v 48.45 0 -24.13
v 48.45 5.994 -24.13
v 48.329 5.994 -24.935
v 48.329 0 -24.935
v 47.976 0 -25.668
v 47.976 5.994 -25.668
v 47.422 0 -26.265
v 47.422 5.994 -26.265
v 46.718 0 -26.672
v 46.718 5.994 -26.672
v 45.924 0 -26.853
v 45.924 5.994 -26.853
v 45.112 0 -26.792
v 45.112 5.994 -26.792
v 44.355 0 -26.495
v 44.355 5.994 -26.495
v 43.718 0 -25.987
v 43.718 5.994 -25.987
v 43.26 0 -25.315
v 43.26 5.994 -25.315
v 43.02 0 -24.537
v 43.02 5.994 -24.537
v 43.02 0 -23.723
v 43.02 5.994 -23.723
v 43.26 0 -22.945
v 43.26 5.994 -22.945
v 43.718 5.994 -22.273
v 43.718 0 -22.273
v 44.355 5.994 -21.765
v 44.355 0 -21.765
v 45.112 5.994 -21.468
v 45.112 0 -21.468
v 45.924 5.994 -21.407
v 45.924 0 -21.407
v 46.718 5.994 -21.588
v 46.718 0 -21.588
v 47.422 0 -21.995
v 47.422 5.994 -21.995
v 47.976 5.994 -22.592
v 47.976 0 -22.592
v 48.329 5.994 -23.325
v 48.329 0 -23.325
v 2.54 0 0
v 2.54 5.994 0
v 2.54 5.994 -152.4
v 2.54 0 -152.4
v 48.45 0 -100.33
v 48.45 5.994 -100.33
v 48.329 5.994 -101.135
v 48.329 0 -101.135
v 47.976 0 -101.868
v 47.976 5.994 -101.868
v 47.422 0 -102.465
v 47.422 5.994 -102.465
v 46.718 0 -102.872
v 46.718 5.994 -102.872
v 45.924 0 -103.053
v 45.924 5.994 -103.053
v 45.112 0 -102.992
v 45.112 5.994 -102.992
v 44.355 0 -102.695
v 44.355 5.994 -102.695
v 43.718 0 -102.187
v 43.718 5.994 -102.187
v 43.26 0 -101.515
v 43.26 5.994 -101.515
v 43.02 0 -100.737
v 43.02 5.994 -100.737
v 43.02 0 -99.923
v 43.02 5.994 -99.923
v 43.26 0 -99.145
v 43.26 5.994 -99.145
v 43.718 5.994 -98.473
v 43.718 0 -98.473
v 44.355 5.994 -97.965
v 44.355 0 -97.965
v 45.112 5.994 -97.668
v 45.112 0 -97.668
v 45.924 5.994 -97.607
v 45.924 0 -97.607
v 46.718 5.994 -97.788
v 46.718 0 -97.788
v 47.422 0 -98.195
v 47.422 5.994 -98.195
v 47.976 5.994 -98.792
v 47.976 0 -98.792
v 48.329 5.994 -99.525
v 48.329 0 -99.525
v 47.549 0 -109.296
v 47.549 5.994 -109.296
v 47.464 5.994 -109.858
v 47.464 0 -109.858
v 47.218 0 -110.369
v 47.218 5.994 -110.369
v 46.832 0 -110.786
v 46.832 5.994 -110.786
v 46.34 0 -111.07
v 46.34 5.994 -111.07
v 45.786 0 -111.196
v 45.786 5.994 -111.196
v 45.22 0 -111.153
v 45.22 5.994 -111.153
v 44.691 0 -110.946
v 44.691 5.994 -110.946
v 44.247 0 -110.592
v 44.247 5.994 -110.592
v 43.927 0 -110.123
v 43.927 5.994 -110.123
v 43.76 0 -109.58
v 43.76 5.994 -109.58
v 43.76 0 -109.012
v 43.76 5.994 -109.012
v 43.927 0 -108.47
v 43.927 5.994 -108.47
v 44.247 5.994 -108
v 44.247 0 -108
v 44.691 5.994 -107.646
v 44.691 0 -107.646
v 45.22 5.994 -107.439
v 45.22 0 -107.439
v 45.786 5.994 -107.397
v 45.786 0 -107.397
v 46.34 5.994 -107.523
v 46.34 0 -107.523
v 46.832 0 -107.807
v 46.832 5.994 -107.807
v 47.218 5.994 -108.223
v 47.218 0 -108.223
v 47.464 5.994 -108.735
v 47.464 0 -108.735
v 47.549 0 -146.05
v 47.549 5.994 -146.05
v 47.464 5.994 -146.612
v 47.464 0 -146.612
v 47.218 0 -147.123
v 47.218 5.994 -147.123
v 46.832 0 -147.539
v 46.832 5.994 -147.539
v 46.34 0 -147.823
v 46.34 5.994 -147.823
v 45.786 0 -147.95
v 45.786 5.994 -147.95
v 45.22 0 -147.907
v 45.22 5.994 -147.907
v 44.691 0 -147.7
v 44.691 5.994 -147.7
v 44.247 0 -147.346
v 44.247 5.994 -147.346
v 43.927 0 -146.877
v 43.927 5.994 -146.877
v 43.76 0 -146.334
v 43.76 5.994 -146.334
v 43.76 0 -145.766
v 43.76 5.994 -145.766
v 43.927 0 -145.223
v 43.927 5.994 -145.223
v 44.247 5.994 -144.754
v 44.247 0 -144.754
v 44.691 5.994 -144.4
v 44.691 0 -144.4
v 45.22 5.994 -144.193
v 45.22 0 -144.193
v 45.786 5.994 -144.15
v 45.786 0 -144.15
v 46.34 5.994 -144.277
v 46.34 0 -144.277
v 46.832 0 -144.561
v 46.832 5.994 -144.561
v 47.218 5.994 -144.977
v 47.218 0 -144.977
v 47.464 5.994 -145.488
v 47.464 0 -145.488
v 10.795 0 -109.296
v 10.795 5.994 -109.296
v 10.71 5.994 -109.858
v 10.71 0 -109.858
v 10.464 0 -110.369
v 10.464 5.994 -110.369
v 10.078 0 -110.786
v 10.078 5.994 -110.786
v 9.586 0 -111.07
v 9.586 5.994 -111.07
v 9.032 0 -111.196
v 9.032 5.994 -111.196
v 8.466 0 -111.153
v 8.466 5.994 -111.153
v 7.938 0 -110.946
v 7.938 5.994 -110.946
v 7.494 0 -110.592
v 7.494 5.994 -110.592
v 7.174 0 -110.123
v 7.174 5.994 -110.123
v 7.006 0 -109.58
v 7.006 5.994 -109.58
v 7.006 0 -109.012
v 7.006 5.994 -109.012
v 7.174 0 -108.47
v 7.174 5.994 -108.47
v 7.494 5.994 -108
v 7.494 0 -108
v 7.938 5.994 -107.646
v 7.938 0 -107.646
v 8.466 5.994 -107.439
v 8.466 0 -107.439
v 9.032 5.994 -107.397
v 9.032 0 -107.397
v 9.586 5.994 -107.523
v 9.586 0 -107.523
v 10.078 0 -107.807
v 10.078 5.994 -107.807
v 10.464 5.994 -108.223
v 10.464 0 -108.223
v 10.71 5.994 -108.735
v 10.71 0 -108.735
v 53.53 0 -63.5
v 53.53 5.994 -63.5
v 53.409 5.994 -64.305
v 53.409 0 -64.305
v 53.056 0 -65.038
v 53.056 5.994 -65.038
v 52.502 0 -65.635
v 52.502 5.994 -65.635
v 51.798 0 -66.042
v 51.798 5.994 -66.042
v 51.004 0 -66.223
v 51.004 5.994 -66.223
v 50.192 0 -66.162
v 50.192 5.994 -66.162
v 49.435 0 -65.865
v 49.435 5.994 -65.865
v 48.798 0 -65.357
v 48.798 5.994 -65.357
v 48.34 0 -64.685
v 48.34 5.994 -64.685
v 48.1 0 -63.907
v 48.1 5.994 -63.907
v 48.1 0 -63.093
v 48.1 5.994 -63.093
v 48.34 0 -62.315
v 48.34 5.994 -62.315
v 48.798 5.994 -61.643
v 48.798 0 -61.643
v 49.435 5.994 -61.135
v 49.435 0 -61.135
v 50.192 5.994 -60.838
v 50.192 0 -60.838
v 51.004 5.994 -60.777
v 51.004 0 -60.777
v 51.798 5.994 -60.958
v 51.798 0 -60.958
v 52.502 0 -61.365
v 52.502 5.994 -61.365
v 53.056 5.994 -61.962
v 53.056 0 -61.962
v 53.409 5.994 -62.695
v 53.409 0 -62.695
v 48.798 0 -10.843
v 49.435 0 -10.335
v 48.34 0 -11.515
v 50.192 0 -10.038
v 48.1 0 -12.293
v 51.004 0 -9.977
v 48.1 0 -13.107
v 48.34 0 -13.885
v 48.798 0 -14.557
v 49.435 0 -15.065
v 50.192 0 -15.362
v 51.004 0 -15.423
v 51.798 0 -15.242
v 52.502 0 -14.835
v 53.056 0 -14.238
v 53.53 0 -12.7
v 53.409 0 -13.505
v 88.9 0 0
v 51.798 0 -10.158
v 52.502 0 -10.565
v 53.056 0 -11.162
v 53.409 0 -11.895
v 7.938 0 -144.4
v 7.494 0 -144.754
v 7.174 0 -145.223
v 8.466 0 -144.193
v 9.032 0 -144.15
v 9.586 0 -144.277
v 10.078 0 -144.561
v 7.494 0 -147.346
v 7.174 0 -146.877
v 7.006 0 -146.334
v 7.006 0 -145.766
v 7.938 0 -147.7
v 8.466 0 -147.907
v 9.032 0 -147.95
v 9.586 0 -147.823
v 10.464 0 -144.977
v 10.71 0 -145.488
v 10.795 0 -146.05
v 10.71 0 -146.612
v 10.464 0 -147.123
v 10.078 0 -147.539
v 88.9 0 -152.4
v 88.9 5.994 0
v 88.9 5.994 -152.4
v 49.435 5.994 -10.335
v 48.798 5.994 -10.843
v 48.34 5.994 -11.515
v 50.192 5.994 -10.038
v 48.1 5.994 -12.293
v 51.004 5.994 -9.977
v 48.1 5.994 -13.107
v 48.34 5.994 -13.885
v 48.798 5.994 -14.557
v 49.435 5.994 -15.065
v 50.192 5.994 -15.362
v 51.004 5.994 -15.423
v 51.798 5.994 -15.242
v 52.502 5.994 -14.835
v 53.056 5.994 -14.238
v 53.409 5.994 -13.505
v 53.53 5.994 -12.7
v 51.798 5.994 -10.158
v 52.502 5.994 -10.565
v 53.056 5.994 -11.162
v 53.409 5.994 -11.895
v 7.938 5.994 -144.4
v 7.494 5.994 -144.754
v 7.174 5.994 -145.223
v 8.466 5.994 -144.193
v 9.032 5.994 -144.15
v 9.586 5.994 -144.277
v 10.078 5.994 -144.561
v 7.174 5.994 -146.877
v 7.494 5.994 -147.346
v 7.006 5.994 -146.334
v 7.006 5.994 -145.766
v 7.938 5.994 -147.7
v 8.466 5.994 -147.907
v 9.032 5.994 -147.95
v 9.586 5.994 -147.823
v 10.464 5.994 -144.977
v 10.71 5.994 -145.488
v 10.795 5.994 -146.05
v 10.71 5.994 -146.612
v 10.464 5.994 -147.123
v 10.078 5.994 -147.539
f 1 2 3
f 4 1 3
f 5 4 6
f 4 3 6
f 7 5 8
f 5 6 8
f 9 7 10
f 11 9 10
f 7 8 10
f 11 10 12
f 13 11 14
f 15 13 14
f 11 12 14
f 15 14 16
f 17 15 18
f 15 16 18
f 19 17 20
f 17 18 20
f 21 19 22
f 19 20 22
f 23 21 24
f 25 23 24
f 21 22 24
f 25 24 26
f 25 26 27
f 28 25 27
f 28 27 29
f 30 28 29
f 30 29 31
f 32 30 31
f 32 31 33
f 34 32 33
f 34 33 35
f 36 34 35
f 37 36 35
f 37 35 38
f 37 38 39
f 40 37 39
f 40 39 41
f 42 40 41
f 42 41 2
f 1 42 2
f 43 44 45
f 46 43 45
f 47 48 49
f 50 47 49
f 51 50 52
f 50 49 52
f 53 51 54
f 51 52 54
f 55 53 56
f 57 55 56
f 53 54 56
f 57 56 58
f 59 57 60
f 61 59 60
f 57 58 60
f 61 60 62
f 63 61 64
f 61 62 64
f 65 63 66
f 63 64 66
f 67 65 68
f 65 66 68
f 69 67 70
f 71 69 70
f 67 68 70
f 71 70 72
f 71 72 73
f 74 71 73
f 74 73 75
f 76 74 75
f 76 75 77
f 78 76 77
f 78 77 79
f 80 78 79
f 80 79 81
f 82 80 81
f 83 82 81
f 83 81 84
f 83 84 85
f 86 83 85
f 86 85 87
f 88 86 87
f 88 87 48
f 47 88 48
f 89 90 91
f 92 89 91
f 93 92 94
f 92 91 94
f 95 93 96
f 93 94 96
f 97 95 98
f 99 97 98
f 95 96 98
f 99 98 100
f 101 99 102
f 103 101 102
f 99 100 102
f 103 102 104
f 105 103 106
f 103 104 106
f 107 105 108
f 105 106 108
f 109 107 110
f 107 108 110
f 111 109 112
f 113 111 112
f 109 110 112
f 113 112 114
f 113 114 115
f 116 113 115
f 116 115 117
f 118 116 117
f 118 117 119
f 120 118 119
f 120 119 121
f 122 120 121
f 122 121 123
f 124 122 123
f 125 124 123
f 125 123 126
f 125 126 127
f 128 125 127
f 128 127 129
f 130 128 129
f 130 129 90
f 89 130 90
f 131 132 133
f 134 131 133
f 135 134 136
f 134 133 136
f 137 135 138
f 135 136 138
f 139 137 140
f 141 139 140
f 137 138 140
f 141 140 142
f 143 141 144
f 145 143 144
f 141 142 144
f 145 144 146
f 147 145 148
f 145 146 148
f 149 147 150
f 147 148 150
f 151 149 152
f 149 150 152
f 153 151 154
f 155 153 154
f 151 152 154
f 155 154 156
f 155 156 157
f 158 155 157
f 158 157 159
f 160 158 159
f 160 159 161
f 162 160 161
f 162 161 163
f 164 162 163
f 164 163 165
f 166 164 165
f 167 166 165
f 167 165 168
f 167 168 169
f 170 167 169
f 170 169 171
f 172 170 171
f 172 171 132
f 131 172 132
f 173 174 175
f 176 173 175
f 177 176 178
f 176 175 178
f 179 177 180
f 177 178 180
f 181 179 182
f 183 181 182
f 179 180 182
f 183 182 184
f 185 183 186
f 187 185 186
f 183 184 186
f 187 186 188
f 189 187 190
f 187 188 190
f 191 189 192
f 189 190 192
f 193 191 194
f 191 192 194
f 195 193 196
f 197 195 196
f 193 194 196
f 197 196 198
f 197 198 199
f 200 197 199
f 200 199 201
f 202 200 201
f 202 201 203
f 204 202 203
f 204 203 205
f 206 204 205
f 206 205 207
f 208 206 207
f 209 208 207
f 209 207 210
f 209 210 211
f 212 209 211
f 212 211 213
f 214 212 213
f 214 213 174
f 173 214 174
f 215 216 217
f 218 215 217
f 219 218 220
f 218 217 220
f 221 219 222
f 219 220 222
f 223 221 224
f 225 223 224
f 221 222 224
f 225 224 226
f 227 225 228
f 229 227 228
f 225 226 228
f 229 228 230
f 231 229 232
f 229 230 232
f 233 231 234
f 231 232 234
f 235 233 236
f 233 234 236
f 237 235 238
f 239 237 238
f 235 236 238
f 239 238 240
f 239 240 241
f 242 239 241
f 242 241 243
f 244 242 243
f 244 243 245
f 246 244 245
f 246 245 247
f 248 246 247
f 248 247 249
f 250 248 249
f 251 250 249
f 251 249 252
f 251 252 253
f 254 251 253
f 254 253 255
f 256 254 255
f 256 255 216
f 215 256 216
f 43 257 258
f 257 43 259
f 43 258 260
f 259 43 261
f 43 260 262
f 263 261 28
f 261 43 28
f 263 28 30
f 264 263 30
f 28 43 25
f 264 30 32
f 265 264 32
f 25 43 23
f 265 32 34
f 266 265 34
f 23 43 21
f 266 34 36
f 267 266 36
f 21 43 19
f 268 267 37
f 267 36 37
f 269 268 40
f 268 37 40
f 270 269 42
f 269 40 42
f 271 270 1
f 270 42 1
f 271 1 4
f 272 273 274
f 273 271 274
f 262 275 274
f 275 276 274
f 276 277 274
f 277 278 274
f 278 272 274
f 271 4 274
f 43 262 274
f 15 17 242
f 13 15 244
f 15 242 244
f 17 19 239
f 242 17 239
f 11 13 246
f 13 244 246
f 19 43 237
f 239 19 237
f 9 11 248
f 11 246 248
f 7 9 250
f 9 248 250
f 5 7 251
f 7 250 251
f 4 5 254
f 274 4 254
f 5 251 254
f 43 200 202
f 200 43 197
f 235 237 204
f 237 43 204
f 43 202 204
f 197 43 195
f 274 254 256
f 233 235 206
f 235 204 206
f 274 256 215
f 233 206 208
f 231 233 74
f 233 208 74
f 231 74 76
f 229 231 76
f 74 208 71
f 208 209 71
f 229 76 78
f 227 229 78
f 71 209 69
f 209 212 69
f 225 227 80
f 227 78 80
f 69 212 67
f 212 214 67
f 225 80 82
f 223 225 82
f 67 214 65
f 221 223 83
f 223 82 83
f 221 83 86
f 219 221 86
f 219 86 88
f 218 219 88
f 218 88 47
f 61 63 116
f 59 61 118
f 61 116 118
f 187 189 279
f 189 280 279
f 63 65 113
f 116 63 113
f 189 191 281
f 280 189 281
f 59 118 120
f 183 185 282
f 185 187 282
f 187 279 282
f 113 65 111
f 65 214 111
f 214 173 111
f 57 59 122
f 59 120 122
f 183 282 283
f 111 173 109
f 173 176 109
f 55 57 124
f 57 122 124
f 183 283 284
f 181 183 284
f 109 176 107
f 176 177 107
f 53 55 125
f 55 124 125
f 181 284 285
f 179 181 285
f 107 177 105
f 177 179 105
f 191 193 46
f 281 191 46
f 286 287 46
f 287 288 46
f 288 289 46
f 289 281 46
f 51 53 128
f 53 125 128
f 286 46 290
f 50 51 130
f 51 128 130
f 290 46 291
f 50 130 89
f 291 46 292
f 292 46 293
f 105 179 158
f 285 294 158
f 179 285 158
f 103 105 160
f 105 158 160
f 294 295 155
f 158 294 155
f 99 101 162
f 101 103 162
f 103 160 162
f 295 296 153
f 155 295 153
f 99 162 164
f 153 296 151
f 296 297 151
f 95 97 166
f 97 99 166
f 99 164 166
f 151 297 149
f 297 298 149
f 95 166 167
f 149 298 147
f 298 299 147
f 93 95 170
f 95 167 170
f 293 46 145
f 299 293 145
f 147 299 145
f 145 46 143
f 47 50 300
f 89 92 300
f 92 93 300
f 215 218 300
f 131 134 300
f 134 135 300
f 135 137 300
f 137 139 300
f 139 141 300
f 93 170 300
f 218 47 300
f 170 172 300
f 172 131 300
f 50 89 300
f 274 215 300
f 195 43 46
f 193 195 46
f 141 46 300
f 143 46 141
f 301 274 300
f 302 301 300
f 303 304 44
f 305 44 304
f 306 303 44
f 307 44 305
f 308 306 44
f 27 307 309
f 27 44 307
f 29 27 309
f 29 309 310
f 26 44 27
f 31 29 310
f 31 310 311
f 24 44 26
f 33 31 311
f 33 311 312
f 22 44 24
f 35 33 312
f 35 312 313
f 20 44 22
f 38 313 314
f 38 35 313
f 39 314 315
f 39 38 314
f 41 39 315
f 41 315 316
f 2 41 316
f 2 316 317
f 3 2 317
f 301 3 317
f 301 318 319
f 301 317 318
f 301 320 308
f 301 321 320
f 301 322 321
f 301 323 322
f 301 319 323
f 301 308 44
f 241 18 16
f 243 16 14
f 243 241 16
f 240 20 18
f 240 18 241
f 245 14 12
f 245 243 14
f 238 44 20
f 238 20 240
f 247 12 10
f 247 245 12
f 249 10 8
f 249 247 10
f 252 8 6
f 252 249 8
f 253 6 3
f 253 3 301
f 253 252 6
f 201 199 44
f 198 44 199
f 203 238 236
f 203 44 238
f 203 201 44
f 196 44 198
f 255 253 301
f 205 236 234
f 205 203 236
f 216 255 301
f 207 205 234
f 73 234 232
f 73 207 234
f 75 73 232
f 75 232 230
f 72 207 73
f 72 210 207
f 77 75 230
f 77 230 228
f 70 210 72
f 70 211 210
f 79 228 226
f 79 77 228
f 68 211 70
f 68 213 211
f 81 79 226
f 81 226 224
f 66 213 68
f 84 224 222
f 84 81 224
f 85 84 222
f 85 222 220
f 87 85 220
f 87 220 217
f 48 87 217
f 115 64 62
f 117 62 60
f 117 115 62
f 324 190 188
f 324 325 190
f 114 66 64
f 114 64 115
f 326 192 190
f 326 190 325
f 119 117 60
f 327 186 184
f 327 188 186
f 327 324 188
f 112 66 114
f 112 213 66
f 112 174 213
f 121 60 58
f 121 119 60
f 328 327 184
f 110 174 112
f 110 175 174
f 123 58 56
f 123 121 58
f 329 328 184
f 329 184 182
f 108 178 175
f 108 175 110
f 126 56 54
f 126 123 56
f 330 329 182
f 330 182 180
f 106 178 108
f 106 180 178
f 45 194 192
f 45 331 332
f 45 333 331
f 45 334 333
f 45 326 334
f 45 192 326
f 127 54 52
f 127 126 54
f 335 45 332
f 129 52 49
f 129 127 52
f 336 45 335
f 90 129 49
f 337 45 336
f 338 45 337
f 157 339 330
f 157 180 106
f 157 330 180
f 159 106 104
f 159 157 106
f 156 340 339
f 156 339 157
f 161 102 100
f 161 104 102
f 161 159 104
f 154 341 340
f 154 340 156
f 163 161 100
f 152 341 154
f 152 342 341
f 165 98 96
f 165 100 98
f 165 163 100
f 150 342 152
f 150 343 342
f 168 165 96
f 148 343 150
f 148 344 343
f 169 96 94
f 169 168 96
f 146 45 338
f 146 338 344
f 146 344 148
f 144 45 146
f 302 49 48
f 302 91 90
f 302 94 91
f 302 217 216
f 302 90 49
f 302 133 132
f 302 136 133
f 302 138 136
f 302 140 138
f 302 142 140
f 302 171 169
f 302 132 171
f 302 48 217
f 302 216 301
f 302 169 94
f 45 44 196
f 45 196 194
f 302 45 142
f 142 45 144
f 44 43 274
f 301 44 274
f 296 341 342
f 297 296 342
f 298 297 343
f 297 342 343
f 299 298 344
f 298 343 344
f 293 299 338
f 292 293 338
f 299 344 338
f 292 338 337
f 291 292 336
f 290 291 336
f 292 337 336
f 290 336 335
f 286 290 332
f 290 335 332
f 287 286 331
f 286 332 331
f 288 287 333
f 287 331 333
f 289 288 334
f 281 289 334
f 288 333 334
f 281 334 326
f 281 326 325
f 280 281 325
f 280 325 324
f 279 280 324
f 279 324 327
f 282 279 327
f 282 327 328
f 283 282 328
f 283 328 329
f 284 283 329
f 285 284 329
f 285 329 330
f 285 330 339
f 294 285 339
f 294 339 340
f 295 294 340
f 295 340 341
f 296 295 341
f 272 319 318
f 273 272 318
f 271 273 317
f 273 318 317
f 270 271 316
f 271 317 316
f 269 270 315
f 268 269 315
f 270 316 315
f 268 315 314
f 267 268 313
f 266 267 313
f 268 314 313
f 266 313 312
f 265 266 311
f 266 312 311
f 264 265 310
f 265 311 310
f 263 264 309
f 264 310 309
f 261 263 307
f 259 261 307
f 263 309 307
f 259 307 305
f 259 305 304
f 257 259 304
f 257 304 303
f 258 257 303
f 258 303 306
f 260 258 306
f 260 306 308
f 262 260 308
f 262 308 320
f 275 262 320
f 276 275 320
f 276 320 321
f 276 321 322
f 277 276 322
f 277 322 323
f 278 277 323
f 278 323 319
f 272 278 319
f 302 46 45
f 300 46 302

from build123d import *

# Parameters (mm, degrees)
SKETCH2_W               = 88.9
SKETCH2_H               = 152.4
BOSS_EXTRUDE1_DEPTH     = 5.9944
SKETCH4_R               = 2.7305
CUT_EXTRUDE2_DEPTH      = 1
CUT_EXTRUDE2_DEPTH_BACK = 6.9944
SKETCH5_R               = 2.7305
CUT_EXTRUDE3_DEPTH      = 1
CUT_EXTRUDE3_DEPTH_BACK = 6.9944
SKETCH6_R               = 1.905
CUT_EXTRUDE4_DEPTH      = 1
CUT_EXTRUDE4_DEPTH_BACK = 6.9944
SKETCH7_W               = 2.54
SKETCH7_H               = 152.4
CUT_EXTRUDE5_DEPTH      = 1
CUT_EXTRUDE5_DEPTH_BACK = 6.9944


with BuildPart() as part:
    # Sketch2 → Boss-Extrude1 (new body)
    with BuildSketch(Plane(origin=(0, 0, 0), x_dir=(1, 0, 0), z_dir=(0, 1, 0))):
        with Locations((44.45, 76.2)):
            Rectangle(SKETCH2_W, SKETCH2_H)
    extrude(amount=BOSS_EXTRUDE1_DEPTH)

    # Sketch4 → Cut-Extrude2 (cut, two sides)
    with BuildSketch(Plane(origin=(0, 5.9944, 0), x_dir=(1, 0, 0), z_dir=(0, 1, 0))) as cut_extrude2_sk:
        with Locations((45.72, 100.33)):
            Circle(SKETCH4_R)
        with Locations((45.72, 24.13)):
            Circle(SKETCH4_R)
    extrude(amount=CUT_EXTRUDE2_DEPTH, mode=Mode.SUBTRACT)
    extrude(cut_extrude2_sk.sketch, amount=-CUT_EXTRUDE2_DEPTH_BACK, mode=Mode.SUBTRACT)

    # Sketch5 → Cut-Extrude3 (cut, two sides)
    with BuildSketch(Plane(origin=(0, 5.9944, 0), x_dir=(1, 0, 0), z_dir=(0, 1, 0))) as cut_extrude3_sk:
        with Locations((50.8, 63.5)):
            Circle(SKETCH5_R)
        with Locations((50.8, 12.7)):
            Circle(SKETCH5_R)
    extrude(amount=CUT_EXTRUDE3_DEPTH, mode=Mode.SUBTRACT)
    extrude(cut_extrude3_sk.sketch, amount=-CUT_EXTRUDE3_DEPTH_BACK, mode=Mode.SUBTRACT)

    # Sketch6 → Cut-Extrude4 (cut, two sides)
    with BuildSketch(Plane(origin=(0, 5.9944, 0), x_dir=(1, 0, 0), z_dir=(0, 1, 0))) as cut_extrude4_sk:
        with Locations((45.6438, 109.2962)):
            Circle(SKETCH6_R)
        with Locations((8.89, 109.2962)):
            Circle(SKETCH6_R)
        with Locations((8.89, 146.05)):
            Circle(SKETCH6_R)
        with Locations((45.6438, 146.05)):
            Circle(SKETCH6_R)
    extrude(amount=CUT_EXTRUDE4_DEPTH, mode=Mode.SUBTRACT)
    extrude(cut_extrude4_sk.sketch, amount=-CUT_EXTRUDE4_DEPTH_BACK, mode=Mode.SUBTRACT)

    # Sketch7 → Cut-Extrude5 (cut, two sides)
    with BuildSketch(Plane(origin=(0, 5.9944, 0), x_dir=(1, 0, 0), z_dir=(0, 1, 0))) as cut_extrude5_sk:
        with Locations((1.27, 76.2)):
            Rectangle(SKETCH7_W, SKETCH7_H)
    extrude(amount=CUT_EXTRUDE5_DEPTH, mode=Mode.SUBTRACT)
    extrude(cut_extrude5_sk.sketch, amount=-CUT_EXTRUDE5_DEPTH_BACK, mode=Mode.SUBTRACT)


solid = part.part
